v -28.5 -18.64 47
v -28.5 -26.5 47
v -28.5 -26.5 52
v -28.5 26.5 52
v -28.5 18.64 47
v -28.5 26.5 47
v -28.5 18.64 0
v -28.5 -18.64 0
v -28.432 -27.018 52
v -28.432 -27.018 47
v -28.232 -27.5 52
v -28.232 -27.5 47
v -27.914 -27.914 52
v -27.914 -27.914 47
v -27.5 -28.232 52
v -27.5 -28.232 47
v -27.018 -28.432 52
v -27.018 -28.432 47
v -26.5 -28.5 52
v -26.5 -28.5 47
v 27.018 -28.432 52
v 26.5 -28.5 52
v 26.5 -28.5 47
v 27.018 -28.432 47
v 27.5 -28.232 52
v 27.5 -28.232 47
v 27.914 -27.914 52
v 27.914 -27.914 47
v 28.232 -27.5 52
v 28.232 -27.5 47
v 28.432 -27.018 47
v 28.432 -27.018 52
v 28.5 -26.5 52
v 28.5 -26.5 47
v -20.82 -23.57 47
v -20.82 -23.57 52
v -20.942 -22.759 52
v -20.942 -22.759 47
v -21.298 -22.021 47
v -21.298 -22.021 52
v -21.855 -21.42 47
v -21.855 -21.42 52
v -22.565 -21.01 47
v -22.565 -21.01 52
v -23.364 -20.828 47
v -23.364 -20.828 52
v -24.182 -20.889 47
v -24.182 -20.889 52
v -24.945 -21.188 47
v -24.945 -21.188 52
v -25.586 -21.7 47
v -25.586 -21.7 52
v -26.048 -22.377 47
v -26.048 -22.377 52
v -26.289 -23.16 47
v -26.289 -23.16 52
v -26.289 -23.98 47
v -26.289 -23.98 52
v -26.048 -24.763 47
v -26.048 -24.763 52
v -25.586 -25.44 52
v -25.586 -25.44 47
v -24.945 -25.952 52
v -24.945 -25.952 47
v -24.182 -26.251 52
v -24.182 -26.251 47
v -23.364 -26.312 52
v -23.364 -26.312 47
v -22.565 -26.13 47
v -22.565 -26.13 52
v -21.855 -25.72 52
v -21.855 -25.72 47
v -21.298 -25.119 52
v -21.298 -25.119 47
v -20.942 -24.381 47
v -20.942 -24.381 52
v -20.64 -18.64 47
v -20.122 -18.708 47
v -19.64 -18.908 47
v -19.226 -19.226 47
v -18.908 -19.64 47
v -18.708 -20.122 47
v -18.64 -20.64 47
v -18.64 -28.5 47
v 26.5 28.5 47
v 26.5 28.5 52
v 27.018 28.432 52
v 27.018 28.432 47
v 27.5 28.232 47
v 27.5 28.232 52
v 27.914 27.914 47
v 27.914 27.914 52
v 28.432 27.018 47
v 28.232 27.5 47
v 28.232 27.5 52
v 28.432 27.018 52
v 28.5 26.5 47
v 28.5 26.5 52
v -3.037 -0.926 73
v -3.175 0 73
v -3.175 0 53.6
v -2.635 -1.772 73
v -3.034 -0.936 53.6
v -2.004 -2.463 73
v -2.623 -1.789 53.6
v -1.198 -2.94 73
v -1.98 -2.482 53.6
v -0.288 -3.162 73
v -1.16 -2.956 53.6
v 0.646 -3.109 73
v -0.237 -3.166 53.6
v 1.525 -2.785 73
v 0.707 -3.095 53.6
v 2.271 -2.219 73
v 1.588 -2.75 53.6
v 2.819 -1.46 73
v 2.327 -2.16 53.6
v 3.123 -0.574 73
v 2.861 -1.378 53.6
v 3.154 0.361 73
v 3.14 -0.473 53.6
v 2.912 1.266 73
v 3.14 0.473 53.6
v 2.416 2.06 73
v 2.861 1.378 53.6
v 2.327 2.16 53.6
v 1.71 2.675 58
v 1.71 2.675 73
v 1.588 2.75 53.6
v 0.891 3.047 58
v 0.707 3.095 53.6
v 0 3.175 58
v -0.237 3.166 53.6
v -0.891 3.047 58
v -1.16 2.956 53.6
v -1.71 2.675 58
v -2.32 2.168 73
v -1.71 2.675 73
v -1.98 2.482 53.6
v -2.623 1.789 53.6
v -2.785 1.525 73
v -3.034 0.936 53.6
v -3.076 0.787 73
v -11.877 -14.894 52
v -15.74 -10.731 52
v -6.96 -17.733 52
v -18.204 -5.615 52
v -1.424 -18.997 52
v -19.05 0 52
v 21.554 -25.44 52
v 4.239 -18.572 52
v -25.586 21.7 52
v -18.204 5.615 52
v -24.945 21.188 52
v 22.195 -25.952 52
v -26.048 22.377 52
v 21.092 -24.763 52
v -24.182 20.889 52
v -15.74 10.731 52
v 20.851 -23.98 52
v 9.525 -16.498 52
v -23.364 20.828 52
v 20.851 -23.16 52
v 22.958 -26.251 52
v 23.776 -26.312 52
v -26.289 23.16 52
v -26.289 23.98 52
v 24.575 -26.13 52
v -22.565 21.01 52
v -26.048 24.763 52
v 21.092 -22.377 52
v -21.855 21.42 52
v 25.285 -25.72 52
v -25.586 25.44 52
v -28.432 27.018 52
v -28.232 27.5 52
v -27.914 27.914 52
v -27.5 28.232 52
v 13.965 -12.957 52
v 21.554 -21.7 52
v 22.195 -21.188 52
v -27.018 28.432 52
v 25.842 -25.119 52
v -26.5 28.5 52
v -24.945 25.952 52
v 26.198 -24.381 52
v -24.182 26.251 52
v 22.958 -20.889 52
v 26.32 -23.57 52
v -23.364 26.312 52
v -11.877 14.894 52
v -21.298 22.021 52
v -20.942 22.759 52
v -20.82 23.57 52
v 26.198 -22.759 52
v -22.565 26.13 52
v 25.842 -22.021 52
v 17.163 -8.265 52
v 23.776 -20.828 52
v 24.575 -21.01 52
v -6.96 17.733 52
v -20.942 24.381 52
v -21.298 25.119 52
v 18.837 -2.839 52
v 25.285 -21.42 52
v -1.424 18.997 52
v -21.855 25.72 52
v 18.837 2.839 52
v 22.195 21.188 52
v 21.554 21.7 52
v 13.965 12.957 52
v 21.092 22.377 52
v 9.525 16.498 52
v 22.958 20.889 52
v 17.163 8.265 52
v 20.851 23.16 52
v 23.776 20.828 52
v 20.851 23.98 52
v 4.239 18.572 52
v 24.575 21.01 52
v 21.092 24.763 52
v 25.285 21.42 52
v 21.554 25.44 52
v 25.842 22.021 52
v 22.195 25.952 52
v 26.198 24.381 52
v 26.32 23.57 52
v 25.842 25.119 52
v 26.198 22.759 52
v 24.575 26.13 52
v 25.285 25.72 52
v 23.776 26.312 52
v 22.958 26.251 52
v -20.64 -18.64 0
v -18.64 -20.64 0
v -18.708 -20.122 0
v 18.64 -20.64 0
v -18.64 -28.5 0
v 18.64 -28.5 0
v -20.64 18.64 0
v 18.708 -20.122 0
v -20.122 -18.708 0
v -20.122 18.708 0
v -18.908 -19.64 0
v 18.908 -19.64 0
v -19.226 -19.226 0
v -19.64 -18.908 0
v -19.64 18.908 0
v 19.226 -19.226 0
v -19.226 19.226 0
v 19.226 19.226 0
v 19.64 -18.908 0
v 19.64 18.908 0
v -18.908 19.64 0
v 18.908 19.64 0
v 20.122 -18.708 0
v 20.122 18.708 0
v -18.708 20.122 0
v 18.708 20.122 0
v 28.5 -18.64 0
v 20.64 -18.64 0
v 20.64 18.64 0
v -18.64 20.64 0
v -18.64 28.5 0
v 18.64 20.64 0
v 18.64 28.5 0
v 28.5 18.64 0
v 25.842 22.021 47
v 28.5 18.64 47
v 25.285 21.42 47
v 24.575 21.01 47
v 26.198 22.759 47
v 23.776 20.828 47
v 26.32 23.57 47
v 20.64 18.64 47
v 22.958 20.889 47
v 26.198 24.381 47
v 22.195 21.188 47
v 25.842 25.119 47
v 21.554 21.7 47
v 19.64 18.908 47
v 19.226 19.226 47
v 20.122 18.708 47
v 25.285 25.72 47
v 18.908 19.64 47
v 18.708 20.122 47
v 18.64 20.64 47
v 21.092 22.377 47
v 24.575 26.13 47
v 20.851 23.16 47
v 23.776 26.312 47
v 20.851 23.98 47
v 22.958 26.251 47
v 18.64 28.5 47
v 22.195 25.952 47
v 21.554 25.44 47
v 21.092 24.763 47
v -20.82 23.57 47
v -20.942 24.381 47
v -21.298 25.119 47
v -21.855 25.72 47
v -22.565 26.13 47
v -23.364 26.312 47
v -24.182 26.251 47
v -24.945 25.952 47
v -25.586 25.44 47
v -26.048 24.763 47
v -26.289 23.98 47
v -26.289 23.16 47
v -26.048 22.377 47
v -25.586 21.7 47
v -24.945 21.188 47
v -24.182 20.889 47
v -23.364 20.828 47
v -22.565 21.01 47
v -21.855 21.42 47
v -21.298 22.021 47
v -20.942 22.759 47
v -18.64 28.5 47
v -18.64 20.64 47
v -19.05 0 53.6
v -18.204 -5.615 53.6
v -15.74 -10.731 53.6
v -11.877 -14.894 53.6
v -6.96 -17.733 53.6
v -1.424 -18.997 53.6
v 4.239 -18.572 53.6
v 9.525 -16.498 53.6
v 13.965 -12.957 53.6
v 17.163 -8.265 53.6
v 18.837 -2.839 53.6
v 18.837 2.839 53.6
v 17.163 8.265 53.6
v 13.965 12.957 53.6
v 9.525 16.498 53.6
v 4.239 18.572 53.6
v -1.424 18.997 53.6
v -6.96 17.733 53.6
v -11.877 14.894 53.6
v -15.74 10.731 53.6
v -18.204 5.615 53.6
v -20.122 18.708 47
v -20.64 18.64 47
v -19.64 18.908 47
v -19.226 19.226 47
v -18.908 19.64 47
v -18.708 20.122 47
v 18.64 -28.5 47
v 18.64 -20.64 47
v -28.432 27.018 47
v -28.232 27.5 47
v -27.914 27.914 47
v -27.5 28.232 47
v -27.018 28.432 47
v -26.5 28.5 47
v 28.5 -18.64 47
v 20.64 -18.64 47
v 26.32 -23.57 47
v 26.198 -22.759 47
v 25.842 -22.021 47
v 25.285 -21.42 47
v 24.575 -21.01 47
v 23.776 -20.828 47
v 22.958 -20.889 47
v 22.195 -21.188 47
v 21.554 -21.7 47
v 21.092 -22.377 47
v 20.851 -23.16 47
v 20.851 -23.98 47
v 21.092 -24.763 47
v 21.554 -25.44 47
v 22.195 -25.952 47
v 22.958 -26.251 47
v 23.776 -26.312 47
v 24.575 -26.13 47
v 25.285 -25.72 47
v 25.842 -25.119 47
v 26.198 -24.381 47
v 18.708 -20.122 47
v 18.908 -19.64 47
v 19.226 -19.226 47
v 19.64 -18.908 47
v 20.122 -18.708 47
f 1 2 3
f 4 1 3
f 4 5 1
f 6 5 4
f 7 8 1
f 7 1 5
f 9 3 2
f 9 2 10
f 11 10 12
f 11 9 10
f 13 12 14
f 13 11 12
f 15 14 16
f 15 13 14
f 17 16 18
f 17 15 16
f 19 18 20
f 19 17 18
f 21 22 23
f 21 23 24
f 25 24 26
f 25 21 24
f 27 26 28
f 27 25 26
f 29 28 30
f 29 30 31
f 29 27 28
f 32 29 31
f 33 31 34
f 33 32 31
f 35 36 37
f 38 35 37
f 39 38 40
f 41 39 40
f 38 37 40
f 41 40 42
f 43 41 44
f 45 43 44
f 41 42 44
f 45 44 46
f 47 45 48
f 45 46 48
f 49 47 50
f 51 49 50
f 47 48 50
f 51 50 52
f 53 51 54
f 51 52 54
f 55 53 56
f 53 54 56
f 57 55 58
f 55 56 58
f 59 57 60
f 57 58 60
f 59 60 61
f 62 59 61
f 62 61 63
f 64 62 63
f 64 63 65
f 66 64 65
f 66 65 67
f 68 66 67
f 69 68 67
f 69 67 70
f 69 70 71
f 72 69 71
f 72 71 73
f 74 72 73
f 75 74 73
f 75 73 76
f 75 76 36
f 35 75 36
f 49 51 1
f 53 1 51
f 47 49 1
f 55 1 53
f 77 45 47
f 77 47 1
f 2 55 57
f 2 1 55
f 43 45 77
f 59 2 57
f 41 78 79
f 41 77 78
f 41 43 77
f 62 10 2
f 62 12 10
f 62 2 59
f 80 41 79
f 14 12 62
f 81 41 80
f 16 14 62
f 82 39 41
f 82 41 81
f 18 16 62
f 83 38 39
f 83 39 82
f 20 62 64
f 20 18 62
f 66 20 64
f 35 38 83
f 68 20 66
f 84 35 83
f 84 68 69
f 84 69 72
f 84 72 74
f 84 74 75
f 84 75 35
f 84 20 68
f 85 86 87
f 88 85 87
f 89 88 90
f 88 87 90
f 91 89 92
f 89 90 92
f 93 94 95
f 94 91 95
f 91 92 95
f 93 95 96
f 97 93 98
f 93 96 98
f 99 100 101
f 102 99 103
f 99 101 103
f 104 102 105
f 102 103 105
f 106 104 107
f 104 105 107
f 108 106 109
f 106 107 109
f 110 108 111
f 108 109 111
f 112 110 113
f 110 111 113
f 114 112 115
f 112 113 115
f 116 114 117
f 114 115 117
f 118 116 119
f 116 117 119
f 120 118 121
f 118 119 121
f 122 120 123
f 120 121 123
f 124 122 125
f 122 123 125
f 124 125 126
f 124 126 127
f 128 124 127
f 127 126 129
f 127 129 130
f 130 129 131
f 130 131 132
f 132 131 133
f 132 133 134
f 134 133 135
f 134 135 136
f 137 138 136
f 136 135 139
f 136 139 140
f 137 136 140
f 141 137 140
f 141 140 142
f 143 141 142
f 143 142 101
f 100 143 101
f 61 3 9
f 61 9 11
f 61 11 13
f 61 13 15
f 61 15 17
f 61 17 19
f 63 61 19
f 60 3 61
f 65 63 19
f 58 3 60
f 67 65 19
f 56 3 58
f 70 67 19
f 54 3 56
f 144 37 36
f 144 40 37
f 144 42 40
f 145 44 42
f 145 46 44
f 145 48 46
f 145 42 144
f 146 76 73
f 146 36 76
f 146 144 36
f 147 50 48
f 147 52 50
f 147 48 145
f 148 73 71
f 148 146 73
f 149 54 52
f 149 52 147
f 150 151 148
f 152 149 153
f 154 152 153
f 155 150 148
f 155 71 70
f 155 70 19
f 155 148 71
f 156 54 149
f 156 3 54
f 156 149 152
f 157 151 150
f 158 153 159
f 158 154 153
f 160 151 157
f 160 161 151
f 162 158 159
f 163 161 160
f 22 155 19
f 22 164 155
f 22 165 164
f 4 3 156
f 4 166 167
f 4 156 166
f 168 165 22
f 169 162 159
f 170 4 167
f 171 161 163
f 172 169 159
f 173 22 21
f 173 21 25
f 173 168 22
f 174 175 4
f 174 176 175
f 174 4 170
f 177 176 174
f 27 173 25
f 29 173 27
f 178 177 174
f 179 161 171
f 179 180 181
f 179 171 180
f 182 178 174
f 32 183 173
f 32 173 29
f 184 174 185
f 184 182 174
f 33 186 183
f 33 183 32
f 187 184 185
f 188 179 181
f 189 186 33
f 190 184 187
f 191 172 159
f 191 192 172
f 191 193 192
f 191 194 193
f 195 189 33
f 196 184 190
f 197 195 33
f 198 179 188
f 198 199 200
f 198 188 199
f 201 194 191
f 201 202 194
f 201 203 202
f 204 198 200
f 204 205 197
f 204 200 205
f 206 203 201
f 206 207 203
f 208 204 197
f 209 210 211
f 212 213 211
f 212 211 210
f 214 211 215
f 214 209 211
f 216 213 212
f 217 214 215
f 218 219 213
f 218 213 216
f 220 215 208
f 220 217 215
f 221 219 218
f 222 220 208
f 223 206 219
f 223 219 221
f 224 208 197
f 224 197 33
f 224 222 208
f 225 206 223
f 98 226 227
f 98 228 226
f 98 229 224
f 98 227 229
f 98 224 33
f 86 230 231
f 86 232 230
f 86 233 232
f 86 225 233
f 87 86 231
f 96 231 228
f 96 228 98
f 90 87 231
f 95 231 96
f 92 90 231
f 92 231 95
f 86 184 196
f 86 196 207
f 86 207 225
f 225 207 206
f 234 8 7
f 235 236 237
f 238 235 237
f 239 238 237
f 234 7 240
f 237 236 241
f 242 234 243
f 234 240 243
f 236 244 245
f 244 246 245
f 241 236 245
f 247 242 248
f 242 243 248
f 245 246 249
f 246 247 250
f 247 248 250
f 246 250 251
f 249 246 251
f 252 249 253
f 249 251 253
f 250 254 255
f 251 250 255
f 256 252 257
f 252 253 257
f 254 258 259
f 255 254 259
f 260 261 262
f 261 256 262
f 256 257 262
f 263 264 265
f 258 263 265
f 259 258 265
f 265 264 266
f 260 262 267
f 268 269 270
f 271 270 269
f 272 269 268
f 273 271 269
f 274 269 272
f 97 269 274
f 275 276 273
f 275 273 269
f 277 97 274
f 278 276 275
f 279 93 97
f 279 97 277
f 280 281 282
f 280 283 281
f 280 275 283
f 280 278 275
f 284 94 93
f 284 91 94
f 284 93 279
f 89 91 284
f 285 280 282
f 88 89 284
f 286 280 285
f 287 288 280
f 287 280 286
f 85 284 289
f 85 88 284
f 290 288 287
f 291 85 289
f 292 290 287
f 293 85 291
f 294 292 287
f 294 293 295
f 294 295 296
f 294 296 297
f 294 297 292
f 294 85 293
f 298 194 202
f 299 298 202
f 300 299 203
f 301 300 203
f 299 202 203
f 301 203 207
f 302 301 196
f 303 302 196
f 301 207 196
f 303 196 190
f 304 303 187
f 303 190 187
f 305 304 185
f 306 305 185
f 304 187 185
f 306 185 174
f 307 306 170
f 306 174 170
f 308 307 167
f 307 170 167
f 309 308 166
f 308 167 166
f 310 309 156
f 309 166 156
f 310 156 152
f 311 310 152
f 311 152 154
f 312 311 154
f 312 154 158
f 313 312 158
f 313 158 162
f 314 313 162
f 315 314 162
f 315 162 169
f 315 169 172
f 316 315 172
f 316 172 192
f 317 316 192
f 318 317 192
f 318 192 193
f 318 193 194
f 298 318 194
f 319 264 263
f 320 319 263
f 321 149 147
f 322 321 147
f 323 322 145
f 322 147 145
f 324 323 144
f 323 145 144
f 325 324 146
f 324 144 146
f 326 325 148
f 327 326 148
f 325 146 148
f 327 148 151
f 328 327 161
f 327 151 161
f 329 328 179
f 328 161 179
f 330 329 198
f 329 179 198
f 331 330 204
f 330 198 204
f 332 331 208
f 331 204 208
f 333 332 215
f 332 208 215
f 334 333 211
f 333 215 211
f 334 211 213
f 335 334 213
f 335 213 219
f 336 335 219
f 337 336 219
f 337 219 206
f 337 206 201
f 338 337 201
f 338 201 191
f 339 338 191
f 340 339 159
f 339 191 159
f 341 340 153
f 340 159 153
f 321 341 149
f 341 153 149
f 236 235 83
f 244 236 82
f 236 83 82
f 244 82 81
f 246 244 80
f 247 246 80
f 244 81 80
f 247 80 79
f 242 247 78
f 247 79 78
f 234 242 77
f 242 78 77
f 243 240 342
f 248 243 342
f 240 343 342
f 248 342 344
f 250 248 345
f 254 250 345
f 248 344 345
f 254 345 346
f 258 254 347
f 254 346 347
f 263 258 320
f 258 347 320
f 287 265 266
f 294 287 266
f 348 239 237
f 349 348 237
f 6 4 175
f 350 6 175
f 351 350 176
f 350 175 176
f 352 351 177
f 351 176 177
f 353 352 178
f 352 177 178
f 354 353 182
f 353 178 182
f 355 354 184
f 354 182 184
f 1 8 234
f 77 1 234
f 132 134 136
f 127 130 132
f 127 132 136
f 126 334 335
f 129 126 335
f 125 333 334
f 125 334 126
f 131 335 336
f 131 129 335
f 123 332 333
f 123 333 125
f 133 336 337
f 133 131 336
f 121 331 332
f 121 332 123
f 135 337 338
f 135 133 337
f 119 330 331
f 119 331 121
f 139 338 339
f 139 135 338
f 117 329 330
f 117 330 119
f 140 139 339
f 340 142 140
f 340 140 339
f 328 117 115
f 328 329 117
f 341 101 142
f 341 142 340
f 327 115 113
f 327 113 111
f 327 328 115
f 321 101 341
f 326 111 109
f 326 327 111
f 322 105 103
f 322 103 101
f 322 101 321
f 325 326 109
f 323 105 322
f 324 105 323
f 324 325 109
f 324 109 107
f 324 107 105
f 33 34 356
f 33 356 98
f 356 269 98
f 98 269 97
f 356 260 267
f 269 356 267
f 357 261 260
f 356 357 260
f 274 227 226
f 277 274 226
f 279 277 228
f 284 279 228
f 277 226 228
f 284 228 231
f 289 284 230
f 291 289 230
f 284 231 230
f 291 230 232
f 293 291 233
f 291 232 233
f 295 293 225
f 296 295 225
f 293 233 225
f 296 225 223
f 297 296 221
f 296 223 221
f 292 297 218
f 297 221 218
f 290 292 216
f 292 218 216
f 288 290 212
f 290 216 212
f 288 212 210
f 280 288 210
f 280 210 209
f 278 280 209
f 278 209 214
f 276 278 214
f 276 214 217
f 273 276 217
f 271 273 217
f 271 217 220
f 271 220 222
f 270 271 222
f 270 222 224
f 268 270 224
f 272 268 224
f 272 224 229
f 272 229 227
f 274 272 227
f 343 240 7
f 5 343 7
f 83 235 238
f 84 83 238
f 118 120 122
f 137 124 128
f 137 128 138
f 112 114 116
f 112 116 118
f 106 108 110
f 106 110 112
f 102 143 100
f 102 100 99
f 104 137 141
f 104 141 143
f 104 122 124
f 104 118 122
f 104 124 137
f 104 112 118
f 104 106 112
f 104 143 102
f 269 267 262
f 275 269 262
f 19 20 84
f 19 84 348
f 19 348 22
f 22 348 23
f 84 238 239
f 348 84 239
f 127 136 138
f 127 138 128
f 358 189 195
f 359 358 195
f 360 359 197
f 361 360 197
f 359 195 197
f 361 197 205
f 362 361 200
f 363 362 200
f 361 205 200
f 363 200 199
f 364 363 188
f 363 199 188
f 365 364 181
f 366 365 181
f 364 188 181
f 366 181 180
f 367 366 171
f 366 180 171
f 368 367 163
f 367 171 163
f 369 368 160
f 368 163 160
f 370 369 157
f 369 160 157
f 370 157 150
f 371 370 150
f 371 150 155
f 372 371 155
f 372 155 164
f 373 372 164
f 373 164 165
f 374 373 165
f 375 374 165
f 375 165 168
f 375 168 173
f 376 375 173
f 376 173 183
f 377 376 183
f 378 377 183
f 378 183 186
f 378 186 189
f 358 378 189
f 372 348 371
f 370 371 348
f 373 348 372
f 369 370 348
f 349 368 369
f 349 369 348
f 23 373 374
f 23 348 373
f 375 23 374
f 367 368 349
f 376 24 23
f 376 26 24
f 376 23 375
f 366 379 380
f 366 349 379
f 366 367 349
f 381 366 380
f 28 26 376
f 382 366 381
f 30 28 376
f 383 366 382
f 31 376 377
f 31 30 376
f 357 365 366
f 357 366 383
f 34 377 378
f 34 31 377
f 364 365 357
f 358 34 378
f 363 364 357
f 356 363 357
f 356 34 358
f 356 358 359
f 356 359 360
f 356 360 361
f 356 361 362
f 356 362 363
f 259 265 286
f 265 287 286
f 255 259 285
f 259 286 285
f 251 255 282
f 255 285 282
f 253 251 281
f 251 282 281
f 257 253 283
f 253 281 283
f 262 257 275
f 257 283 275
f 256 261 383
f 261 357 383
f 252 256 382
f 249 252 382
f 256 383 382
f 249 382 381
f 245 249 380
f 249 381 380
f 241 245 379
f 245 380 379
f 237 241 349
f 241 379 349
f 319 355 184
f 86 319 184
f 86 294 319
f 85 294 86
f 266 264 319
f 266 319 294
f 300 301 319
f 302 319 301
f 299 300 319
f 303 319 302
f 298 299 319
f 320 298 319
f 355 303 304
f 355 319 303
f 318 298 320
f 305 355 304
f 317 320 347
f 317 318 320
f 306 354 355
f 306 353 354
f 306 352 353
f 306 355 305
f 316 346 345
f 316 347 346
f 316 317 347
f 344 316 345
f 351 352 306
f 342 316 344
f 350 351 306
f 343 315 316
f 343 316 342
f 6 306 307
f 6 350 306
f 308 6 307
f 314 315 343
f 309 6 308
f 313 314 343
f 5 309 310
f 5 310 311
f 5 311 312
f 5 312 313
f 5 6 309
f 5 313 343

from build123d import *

# Parameters (mm, degrees)
SKETCH1_W                = 57
SKETCH1_H                = 57
BOSS_EXTRUDE1_DEPTH      = 52
SKETCH2_R                = 3.175
BOSS_EXTRUDE2_DEPTH      = 21
FILLET1_R                = 2
SKETCH9_R                = 19.05
BOSS_EXTRUDE3_DEPTH      = 1.6
SKETCH11_R               = 2.75
CUT_EXTRUDE3_DEPTH       = 66.791336816
CUT_EXTRUDE2_START       = -15
CUT_EXTRUDE2_DEPTH       = 15
SKETCH12_W               = 9.86
SKETCH12_H               = 9.86
CUT_EXTRUDE4_DEPTH       = 47
FILLET2_R                = 2
CIRPATTERN1_COUNT        = 4
FILLET2_OF_CIRPATTERN1_R = 2


with BuildPart() as part:
    # Sketch1 → Boss-Extrude1 (new body)
    with BuildSketch(Plane.XY):
        Rectangle(SKETCH1_W, SKETCH1_H)
    extrude(amount=BOSS_EXTRUDE1_DEPTH)

    # Sketch2 → Boss-Extrude2 (add)
    with BuildSketch(Plane.XY.offset(52)):
        with Locations(Location((0, 0, 0), (0, 0, 180))):
            Circle(SKETCH2_R)
    extrude(amount=BOSS_EXTRUDE2_DEPTH)

    # Fillet1
    fillet1_edges = [part.edges().sort_by_distance(p)[0] for p in [
        (28.5, -28.5, 26),
        (-28.5, -28.5, 26),
        (-28.5, 28.5, 26),
        (28.5, 28.5, 26),
    ]]
    fillet(fillet1_edges, radius=FILLET1_R)

    # Sketch9 → Boss-Extrude3 (add)
    with BuildSketch(Plane.XY.offset(52)):
        with Locations(Location((0, 0, 0), (0, 0, 180))):
            Circle(SKETCH9_R)
    extrude(amount=BOSS_EXTRUDE3_DEPTH)

    # Sketch11 → Cut-Extrude3 (cut, through all)
    with BuildSketch(Plane.XY.offset(52)):
        with Locations((23.57, 23.57)):
            Circle(SKETCH11_R)
        with Locations((23.57, -23.57)):
            Circle(SKETCH11_R)
        with Locations((-23.57, -23.57)):
            Circle(SKETCH11_R)
        with Locations((-23.57, 23.57)):
            Circle(SKETCH11_R)
    extrude(amount=-CUT_EXTRUDE3_DEPTH, mode=Mode.SUBTRACT)

    # Sketch10 → Cut-Extrude2 (cut)
    with BuildSketch(Plane.XY.offset(73).offset(CUT_EXTRUDE2_START)):
        with BuildLine():
            Line((-1.710263138, 2.675), (1.710263138, 2.675))
            ThreePointArc((1.710263138, 2.675), (0, 3.175), (-1.710263138, 2.675))
        make_face()
    extrude(amount=CUT_EXTRUDE2_DEPTH, mode=Mode.SUBTRACT)

    # Sketch12 → Cut-Extrude4 (cut)
    with BuildSketch(Plane(origin=(0, 0, 0), x_dir=(-1, 0, 0), z_dir=(0, 0, -1))):
        with Locations((-23.57, 23.57)):
            Rectangle(SKETCH12_W, SKETCH12_H)
    cut_extrude4 = extrude(amount=-CUT_EXTRUDE4_DEPTH, mode=Mode.SUBTRACT)

    # Fillet2
    fillet2_edges = [part.edges().sort_by_distance(p)[0] for p in [
        (18.64, 18.64, 23.5),
    ]]
    fillet(fillet2_edges, radius=FILLET2_R)

    # CirPattern1: Cut-Extrude4 ×4 about axis
    cirpattern1_axis = Axis((0, 0, 0), (0, 0, 1))
    for i in range(1, CIRPATTERN1_COUNT):
        add(cut_extrude4.rotate(cirpattern1_axis, i * 360 / CIRPATTERN1_COUNT), mode=Mode.SUBTRACT)

    # Fillet2 of CirPattern1
    fillet2_of_cirpattern1_edges = [part.edges().sort_by_distance(p)[0] for p in [
        (-18.64, 18.64, 23.5),
        (-18.64, -18.64, 23.5),
        (18.64, -18.64, 23.5),
    ]]
    fillet(fillet2_of_cirpattern1_edges, radius=FILLET2_OF_CIRPATTERN1_R)


solid = part.part
